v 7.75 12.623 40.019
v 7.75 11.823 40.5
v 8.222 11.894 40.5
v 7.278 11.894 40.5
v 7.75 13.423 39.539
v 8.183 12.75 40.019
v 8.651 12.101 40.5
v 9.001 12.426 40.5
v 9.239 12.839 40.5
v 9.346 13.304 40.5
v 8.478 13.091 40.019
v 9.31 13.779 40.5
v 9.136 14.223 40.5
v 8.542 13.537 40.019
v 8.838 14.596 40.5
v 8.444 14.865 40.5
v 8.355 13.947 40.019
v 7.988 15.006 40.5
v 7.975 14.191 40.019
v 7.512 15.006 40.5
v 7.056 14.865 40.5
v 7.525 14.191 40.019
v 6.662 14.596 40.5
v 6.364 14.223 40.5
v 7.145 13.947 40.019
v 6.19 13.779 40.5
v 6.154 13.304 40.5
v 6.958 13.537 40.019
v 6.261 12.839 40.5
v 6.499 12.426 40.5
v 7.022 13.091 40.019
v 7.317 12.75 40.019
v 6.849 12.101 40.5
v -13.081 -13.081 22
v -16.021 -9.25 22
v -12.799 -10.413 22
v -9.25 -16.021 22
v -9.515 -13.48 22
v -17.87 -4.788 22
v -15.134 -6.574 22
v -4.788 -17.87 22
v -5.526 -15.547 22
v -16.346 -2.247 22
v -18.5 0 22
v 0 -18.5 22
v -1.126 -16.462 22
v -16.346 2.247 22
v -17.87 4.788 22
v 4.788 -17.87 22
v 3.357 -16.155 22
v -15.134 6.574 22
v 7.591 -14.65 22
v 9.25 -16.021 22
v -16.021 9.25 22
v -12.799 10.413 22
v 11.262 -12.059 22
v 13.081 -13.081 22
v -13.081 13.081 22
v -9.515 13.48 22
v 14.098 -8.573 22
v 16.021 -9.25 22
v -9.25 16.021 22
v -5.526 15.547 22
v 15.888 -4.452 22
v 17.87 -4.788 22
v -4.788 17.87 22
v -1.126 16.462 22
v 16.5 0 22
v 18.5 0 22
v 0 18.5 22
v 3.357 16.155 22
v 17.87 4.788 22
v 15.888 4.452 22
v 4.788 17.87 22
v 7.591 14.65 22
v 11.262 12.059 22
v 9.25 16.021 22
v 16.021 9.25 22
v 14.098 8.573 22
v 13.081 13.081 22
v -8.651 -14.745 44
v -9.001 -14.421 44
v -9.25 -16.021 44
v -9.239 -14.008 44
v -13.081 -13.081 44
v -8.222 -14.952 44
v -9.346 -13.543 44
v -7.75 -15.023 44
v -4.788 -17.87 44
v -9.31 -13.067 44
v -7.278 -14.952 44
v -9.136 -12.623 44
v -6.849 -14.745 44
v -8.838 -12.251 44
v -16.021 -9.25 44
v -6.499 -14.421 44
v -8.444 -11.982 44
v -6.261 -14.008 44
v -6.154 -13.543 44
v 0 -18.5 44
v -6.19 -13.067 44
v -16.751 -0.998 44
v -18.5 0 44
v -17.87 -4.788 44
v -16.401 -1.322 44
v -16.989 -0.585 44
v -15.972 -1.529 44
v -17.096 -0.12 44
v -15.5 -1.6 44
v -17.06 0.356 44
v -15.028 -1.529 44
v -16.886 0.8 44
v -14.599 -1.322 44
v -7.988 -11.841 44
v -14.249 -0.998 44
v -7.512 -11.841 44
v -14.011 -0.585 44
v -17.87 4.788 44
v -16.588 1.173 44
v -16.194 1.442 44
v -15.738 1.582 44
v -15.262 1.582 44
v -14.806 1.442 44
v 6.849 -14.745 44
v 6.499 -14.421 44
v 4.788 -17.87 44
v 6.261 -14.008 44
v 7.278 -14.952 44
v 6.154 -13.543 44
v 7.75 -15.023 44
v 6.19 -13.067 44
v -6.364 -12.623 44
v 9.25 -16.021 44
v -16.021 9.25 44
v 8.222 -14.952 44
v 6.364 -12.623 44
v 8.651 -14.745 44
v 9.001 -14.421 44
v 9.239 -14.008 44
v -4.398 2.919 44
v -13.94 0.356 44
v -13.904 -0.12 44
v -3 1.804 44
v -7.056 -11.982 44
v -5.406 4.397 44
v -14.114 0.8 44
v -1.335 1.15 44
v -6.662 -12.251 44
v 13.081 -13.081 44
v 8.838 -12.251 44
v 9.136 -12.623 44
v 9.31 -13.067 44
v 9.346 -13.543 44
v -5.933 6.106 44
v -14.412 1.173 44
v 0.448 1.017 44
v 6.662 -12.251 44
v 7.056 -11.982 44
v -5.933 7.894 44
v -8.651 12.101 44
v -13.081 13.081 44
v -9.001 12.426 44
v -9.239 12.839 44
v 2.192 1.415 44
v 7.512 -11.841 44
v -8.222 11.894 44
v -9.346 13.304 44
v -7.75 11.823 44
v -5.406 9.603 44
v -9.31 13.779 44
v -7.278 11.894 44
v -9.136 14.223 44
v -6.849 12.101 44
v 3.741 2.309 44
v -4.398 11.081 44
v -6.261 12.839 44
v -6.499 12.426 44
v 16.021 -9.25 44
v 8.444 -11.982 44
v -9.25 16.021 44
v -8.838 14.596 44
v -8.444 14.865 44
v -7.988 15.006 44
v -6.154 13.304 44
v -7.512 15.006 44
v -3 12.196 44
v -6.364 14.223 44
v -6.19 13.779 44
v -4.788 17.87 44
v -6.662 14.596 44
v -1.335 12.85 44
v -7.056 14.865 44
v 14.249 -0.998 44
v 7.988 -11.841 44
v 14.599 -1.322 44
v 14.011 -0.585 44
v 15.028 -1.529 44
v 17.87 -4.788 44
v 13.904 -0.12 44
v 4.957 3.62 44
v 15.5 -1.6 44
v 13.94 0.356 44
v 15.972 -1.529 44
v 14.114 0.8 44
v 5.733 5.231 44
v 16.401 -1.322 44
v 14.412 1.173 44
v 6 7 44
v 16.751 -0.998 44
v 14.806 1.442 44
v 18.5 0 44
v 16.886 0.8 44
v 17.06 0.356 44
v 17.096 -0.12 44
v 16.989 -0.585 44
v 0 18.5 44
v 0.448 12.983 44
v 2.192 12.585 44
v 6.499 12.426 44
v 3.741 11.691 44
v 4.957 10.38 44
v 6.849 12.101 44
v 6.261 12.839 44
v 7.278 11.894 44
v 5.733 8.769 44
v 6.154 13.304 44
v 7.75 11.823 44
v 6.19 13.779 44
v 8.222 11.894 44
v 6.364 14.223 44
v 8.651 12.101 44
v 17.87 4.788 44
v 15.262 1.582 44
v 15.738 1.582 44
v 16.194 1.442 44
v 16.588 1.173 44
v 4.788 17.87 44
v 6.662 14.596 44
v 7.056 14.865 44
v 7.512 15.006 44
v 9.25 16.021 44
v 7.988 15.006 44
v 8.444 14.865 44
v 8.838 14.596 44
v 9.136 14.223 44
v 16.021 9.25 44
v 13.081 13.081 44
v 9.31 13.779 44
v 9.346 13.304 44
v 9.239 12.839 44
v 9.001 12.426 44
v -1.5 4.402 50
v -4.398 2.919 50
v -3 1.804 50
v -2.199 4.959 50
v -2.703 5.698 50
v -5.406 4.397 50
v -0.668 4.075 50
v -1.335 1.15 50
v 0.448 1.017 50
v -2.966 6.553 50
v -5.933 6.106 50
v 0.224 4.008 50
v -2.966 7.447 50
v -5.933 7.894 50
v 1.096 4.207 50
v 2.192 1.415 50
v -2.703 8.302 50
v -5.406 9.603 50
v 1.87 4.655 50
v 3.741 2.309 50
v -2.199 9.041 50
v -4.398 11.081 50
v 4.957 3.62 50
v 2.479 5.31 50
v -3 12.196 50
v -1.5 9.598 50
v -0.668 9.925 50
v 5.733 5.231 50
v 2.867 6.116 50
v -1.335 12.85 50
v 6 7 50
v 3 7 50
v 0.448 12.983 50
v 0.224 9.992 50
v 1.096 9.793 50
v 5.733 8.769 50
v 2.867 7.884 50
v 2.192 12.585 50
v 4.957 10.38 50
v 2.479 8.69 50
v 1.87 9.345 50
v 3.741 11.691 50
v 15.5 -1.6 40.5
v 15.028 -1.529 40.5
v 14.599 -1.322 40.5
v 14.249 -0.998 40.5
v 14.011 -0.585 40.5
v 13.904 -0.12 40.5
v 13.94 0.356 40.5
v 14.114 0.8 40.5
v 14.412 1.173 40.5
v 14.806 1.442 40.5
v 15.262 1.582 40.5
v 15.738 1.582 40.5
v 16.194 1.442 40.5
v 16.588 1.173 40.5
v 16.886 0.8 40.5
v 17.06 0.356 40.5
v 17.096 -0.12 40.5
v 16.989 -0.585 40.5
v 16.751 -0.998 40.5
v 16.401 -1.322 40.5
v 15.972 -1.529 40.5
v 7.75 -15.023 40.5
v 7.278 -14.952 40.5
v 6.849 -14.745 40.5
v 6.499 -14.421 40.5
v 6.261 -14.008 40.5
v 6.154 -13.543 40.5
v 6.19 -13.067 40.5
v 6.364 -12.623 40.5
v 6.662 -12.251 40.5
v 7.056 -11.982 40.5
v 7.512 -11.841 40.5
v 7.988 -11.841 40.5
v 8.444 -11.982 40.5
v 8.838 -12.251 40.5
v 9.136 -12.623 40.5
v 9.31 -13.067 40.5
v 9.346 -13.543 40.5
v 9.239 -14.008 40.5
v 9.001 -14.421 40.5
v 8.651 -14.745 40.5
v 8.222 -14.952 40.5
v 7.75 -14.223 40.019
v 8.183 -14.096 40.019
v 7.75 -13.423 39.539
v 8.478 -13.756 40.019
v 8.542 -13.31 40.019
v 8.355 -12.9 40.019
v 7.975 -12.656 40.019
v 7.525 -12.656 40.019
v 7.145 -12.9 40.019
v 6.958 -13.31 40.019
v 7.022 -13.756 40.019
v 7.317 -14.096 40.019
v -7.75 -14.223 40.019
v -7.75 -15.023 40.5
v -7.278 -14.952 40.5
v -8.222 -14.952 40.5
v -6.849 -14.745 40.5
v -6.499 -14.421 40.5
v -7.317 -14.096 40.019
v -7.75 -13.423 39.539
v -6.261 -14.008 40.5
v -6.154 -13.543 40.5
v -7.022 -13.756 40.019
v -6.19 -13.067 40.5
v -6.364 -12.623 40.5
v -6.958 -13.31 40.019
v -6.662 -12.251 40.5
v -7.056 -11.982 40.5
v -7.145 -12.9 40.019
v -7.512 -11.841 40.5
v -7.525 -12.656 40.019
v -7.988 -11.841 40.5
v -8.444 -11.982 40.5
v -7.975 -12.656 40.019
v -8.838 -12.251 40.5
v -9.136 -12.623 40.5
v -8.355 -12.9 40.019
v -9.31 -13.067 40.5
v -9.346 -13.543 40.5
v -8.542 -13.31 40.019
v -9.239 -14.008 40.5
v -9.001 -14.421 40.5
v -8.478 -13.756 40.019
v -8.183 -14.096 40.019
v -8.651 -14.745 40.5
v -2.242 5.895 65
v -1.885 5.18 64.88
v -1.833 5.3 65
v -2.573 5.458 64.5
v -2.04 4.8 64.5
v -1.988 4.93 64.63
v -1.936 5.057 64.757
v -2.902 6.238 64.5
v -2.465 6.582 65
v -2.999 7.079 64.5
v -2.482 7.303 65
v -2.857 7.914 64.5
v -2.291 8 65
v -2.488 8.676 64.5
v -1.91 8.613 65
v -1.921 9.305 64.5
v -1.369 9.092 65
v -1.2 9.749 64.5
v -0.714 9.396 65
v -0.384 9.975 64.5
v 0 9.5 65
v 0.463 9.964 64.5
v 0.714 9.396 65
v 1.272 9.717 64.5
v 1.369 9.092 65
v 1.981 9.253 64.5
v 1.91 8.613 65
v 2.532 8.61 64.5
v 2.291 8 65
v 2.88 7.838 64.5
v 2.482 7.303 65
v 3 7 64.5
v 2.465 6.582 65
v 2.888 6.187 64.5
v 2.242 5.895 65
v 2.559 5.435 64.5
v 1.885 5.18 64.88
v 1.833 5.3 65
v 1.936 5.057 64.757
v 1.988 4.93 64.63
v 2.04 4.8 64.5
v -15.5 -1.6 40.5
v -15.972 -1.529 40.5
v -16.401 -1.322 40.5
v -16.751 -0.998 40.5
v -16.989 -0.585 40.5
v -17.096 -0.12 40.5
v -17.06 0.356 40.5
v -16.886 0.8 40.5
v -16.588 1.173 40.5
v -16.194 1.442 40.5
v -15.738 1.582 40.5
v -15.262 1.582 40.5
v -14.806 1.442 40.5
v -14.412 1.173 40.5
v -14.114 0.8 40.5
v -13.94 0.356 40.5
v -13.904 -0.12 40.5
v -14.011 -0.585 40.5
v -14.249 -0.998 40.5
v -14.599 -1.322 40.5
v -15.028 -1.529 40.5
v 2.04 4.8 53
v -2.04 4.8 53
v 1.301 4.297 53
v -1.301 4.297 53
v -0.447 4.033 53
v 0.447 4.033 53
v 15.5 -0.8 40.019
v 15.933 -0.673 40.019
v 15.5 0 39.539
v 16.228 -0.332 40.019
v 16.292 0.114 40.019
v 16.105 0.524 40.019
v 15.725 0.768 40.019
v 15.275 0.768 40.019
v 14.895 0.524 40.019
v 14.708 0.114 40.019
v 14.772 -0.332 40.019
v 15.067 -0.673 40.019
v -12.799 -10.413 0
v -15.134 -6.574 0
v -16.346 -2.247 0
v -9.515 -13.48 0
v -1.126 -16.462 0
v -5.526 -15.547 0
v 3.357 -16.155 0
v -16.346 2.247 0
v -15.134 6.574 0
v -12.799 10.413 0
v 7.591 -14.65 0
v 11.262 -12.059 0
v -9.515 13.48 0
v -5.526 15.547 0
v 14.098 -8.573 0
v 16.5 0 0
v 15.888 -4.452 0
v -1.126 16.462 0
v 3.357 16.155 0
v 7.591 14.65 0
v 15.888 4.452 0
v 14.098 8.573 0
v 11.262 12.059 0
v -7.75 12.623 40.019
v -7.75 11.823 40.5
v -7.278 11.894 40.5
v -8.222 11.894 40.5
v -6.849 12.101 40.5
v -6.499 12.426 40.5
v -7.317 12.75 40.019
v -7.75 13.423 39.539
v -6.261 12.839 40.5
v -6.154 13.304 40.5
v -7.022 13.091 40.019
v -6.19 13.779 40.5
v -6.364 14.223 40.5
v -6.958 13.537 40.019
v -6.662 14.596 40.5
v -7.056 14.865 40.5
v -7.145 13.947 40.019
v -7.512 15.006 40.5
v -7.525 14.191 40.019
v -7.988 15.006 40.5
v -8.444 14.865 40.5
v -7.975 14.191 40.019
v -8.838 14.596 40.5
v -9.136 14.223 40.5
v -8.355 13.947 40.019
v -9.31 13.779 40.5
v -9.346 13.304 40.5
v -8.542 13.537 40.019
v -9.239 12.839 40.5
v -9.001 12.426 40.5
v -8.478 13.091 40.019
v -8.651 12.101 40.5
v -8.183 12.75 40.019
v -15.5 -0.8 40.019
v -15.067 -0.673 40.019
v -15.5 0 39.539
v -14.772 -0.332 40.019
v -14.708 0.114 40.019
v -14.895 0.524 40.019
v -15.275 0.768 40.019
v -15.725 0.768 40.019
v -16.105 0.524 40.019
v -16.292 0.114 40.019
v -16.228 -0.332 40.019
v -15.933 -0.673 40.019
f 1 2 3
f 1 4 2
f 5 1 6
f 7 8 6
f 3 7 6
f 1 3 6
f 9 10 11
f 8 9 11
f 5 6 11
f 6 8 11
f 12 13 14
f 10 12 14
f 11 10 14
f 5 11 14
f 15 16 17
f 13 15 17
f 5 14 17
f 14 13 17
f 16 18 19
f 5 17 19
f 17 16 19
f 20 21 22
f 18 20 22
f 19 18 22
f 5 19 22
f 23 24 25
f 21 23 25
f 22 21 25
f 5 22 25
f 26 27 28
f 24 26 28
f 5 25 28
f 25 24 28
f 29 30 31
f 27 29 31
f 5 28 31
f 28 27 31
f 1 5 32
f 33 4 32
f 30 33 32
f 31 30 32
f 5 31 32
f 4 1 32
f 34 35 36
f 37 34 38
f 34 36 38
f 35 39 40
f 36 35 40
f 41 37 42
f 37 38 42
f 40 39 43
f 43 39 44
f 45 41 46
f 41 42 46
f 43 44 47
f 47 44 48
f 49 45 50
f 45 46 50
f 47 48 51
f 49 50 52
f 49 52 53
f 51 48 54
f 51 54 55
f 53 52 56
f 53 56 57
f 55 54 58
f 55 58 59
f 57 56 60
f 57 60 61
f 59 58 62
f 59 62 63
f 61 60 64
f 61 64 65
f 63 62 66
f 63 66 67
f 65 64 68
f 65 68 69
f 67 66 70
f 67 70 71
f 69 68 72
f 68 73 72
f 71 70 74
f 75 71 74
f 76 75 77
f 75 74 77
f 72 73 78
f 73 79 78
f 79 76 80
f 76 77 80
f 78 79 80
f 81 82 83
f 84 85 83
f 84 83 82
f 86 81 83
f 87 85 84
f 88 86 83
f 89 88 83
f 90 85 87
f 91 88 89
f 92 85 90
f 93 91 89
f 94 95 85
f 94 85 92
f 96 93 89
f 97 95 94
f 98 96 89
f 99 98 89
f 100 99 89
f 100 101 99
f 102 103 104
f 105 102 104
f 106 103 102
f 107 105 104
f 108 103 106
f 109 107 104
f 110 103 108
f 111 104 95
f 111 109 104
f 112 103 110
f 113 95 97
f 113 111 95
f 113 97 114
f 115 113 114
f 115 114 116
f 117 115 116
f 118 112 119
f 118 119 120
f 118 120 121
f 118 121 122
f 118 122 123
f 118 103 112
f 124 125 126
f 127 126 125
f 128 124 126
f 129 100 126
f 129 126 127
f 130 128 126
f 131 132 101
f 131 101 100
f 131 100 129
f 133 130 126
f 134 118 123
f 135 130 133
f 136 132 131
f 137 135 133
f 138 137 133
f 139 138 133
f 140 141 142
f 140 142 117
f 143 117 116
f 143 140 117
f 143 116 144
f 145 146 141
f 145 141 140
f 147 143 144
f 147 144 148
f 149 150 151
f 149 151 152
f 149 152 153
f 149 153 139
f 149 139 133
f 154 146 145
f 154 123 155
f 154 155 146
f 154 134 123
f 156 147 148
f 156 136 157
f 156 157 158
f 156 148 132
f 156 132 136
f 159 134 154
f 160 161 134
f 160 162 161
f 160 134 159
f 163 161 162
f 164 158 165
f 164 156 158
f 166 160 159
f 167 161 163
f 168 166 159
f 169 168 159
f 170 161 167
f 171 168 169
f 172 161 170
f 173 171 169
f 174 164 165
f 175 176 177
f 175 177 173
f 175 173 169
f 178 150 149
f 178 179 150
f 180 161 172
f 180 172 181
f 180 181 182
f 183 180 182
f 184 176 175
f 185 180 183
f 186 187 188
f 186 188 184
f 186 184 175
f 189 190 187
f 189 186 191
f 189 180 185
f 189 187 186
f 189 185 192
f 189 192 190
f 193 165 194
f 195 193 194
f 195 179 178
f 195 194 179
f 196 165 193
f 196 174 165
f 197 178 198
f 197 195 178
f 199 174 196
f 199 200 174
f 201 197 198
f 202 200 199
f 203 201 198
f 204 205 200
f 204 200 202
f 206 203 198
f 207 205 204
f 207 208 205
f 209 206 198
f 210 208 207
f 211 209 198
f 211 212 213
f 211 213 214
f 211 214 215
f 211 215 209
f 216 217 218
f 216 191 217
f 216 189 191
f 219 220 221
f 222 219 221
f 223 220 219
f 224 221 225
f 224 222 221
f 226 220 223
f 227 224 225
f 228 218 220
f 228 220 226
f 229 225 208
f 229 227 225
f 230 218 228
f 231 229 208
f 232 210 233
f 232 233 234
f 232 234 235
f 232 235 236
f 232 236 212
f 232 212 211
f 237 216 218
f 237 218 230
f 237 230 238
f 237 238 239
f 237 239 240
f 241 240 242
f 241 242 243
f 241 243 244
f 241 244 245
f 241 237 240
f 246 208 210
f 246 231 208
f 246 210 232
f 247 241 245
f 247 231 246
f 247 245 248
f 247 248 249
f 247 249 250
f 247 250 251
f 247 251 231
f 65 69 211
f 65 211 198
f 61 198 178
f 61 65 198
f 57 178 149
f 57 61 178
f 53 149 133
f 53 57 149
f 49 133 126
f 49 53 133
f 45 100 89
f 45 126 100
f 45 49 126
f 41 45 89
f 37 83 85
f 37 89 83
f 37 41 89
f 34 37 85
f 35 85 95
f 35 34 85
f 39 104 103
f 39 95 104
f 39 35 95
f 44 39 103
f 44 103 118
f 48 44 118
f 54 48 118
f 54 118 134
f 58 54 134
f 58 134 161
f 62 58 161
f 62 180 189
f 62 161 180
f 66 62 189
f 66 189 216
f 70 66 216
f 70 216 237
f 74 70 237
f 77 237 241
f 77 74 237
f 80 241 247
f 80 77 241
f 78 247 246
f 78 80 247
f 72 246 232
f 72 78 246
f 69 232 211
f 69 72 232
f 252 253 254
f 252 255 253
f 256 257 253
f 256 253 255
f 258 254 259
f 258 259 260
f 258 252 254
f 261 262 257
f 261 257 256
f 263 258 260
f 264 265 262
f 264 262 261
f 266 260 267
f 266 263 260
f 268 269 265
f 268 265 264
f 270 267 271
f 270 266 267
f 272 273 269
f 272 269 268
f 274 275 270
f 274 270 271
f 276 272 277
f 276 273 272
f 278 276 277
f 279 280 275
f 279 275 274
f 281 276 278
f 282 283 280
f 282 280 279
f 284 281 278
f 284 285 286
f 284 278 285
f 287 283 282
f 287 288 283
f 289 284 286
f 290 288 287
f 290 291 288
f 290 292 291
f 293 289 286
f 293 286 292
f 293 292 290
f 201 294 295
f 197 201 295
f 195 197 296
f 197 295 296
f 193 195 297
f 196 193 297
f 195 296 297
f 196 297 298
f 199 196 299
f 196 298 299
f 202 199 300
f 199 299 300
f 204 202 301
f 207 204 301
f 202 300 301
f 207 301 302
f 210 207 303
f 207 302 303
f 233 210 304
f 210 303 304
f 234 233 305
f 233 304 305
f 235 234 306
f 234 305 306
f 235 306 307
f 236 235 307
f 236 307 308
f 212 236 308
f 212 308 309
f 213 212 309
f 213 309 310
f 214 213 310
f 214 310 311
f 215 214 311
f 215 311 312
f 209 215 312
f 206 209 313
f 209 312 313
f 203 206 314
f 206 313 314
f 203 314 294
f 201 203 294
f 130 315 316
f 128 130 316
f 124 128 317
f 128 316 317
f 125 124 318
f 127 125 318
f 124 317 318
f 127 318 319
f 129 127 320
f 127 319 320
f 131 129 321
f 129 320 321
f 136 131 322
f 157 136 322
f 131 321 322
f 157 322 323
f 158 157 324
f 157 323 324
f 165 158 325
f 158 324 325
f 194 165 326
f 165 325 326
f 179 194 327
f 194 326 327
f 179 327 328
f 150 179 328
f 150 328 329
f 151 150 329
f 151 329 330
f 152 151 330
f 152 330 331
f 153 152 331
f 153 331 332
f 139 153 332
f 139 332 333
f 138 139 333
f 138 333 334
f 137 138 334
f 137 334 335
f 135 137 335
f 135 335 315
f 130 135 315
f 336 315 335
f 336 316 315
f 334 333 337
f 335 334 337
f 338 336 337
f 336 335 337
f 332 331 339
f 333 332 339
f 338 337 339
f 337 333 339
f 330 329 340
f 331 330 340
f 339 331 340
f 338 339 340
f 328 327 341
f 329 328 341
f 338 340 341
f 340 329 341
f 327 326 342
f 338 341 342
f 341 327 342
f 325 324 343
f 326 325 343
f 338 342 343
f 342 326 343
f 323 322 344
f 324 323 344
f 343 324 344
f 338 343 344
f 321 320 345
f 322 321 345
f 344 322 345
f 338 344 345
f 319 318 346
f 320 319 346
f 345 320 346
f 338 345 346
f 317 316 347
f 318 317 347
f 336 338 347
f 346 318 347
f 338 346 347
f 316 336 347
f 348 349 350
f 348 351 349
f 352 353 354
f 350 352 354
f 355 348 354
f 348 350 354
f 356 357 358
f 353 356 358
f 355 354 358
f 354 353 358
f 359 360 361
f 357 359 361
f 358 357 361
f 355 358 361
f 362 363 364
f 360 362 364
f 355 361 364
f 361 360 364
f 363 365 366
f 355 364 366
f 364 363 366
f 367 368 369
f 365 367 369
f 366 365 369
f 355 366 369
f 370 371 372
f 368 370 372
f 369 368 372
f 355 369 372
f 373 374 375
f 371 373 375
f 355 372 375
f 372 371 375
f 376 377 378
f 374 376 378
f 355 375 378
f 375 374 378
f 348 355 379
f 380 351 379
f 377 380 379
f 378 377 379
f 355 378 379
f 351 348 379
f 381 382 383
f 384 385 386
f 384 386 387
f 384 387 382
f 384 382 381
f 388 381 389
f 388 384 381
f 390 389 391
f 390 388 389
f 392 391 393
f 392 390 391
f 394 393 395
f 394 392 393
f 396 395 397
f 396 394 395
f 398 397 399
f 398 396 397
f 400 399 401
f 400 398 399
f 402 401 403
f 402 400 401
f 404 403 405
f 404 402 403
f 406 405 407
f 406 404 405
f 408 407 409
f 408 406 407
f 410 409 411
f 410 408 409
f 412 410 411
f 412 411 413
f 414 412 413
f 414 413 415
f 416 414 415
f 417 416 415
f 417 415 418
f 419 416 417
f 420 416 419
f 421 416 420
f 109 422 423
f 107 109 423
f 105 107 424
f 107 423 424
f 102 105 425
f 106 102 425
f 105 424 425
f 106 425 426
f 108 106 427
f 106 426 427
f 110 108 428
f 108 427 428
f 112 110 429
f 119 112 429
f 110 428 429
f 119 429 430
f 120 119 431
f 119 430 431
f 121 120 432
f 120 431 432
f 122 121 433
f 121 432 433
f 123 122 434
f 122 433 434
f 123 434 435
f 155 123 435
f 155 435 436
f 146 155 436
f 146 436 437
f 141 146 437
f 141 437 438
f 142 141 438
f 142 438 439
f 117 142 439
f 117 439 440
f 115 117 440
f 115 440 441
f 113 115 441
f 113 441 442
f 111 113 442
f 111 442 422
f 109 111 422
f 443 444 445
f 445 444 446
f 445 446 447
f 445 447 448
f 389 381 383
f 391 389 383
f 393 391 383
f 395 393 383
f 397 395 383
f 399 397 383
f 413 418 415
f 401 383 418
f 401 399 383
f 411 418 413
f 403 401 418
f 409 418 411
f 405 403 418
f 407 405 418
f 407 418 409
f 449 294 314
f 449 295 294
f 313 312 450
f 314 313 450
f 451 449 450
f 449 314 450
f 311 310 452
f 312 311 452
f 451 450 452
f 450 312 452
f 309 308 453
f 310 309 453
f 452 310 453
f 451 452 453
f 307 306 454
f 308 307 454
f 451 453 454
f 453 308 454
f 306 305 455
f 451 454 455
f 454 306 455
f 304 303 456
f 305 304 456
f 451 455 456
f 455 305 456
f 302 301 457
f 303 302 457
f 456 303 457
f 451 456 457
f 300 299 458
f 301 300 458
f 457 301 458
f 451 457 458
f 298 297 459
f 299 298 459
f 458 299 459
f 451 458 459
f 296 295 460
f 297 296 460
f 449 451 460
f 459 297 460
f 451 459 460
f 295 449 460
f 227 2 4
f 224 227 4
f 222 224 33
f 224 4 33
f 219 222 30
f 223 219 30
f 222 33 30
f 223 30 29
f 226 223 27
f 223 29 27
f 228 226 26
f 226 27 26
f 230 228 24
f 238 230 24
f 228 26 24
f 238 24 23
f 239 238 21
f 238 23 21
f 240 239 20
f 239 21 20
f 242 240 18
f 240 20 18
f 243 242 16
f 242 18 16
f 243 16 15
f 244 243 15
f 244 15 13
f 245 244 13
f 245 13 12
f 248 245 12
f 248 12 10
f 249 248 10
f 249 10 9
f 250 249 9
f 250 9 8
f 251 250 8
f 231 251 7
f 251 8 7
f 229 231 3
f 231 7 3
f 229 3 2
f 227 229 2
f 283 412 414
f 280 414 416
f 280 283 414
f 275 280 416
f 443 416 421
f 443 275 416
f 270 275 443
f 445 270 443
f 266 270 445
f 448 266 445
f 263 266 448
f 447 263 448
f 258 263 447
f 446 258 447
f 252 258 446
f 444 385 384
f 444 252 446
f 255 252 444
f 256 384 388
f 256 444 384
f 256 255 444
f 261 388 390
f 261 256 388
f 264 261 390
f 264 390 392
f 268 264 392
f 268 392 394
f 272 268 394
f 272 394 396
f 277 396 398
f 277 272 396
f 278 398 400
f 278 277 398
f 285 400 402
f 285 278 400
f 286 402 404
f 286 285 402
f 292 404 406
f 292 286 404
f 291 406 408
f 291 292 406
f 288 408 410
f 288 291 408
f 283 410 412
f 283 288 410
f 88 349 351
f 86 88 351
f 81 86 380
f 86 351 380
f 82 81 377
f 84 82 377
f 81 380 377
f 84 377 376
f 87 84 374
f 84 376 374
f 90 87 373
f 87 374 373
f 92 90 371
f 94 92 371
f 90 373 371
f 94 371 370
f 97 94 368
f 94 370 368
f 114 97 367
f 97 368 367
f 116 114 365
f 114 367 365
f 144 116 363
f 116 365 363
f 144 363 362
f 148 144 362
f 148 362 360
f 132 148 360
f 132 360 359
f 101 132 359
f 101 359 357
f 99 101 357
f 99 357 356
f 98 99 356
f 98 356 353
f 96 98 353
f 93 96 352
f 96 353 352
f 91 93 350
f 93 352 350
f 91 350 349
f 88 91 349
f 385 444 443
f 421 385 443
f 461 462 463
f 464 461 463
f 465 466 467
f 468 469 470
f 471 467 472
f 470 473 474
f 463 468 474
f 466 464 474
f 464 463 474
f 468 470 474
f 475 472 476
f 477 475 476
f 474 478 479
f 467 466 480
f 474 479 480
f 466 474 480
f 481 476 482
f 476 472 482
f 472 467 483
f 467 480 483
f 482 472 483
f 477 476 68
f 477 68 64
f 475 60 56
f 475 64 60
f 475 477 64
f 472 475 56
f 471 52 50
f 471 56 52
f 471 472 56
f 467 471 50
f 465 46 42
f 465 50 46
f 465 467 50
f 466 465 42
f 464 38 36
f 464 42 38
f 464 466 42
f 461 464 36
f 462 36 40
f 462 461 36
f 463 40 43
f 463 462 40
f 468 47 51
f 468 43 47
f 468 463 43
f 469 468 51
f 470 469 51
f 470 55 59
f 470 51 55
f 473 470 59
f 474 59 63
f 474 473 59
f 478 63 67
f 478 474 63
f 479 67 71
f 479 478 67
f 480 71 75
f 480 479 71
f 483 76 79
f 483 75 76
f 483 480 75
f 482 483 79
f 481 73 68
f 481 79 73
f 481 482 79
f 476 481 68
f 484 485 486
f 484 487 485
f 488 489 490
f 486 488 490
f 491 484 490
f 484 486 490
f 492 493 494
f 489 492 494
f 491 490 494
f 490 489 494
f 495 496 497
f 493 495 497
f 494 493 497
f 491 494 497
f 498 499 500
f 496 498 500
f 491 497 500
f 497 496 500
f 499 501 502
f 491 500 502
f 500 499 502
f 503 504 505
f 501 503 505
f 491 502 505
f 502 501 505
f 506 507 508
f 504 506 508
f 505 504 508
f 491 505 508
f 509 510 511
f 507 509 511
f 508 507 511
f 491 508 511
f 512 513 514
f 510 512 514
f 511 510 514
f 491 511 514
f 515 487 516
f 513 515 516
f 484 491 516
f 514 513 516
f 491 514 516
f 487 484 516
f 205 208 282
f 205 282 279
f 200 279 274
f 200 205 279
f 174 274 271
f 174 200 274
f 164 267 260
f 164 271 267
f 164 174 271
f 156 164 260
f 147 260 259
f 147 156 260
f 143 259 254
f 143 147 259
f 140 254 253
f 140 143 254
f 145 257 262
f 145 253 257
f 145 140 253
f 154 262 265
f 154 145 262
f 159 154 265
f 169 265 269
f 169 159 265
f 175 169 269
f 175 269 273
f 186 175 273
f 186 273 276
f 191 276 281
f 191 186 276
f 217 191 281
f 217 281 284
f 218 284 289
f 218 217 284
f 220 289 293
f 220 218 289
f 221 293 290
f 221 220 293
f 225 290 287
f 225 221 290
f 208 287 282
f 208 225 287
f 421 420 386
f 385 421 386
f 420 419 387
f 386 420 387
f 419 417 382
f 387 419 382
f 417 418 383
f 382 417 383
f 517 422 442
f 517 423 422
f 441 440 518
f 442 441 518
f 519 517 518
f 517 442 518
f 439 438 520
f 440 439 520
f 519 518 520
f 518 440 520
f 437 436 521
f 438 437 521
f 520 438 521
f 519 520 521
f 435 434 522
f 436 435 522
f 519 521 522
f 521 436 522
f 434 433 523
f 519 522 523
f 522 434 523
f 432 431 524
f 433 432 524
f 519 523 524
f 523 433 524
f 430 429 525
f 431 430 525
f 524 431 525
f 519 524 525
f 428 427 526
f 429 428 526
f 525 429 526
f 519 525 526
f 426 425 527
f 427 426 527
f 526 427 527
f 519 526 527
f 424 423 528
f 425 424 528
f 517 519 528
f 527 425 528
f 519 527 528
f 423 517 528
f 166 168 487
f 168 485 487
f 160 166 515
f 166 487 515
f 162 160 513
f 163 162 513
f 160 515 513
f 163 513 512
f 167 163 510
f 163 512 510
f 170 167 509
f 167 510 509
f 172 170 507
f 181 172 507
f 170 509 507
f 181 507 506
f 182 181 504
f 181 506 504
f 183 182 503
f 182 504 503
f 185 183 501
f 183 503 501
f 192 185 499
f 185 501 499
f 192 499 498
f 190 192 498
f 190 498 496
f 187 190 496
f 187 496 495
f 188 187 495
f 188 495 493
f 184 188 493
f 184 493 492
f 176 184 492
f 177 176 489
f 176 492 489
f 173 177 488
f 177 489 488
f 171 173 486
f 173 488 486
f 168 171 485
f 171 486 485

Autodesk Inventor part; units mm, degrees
ref_plane "YZ Plane" through (0, 0, 0) normal (1, 0, 0) x (0, 1, 0)
ref_plane "XZ Plane" through (0, 0, 0) normal (0, 1, 0) x (-1, 0, 0)
ref_plane "XY Plane" through (0, 0, 0) normal (0, 0, 1) x (1, 0, 0)
sketch "Sketch1" plane through (0, 0, 0) normal (0, 0, 1) x (1, 0, 0)
  circle A0 centre (0, 0) radius 16.5
  dimension "d0" = 33
extrude "Extrusion1" add sketch "Sketch1" along normal blind 22
sketch "Sketch2" plane through (0, 0, 22) normal (0, 0, 1) x (1, 0, 0)
  circle A0 centre (0, 0) radius 16.5 projected
  circle A1 centre (0, 0) radius 18.5
  dimension "d4" = 37
extrude "Extrusion2" add sketch "Sketch2" along normal blind 22 contours A0 | A1
sketch "Sketch3" plane through (0, 0, 44) normal (0, 0, 1) x (1, 0, 0)
  circle A0 centre (0, 7) radius 6
  point P0 (0, 0)
  dimension "d7" = 12
  dimension "d8" = 7
extrude "Extrusion3" add sketch "Sketch3" along normal blind 6
sketch "Sketch4" plane through (0, 7, 50) normal (0, 0, 1) x (1, 0, 0)
  circle A0 centre (0, 0) radius 3
  circle A1 centre (0, 0) radius 6 construction
  point P0 (0, -7)
  dimension "d11" = 6
extrude "Extrusion4" add sketch "Sketch4" along normal blind 3
sketch "Sketch5" plane through (0, 7, 53) normal (0, 0, 1) x (1, 0, 0)
  circle A0 centre (0, 0) radius 3 projected
  circle A1 centre (0, 0) radius 3 projected
  line L0 (-2.0396, -2.2) -> (2.0396, -2.2)
  point P0 (0, -7)
  dimension "d14" = 5.2
extrude "Extrusion5" add sketch "Sketch5" along normal blind 12 contours A0 L0 picked at (0.0839, -0.4702)
chamfer "Chamfer1" distance 0.5 angle 45 2 edges at (0, 10, 65) (0, 4.8, 65)
sketch "Sketch6" plane through (0, 0, 44) normal (0, 0, 1) x (1, 0, 0)
  circle A0 centre (0, 0) radius 15.5 construction
  line L0 (0, -25.9) -> (0, 25.9) construction
  point P0 (15.5, 0)
  point P1 (-15.5, 0)
  point P2 (-7.75, -13.4234)
  point P3 (7.75, 13.4234)
  point P4 (7.75, -13.4234)
  point P5 (-7.75, 13.4234)
  dimension "d20" = 31
  dimension "d23" = 120
hole "Hole1" at (15.5, 0, 44) at (-15.5, 0, 44) at (-7.75, -13.4234, 44) at (7.75, 13.4234, 44) at (7.75, -13.4234, 44) at (-7.75, 13.4234, 44) direction (0, 0, -1) diameter 3.2 depth 3.5 tip angle 118
properties part number "12v DC motor"
